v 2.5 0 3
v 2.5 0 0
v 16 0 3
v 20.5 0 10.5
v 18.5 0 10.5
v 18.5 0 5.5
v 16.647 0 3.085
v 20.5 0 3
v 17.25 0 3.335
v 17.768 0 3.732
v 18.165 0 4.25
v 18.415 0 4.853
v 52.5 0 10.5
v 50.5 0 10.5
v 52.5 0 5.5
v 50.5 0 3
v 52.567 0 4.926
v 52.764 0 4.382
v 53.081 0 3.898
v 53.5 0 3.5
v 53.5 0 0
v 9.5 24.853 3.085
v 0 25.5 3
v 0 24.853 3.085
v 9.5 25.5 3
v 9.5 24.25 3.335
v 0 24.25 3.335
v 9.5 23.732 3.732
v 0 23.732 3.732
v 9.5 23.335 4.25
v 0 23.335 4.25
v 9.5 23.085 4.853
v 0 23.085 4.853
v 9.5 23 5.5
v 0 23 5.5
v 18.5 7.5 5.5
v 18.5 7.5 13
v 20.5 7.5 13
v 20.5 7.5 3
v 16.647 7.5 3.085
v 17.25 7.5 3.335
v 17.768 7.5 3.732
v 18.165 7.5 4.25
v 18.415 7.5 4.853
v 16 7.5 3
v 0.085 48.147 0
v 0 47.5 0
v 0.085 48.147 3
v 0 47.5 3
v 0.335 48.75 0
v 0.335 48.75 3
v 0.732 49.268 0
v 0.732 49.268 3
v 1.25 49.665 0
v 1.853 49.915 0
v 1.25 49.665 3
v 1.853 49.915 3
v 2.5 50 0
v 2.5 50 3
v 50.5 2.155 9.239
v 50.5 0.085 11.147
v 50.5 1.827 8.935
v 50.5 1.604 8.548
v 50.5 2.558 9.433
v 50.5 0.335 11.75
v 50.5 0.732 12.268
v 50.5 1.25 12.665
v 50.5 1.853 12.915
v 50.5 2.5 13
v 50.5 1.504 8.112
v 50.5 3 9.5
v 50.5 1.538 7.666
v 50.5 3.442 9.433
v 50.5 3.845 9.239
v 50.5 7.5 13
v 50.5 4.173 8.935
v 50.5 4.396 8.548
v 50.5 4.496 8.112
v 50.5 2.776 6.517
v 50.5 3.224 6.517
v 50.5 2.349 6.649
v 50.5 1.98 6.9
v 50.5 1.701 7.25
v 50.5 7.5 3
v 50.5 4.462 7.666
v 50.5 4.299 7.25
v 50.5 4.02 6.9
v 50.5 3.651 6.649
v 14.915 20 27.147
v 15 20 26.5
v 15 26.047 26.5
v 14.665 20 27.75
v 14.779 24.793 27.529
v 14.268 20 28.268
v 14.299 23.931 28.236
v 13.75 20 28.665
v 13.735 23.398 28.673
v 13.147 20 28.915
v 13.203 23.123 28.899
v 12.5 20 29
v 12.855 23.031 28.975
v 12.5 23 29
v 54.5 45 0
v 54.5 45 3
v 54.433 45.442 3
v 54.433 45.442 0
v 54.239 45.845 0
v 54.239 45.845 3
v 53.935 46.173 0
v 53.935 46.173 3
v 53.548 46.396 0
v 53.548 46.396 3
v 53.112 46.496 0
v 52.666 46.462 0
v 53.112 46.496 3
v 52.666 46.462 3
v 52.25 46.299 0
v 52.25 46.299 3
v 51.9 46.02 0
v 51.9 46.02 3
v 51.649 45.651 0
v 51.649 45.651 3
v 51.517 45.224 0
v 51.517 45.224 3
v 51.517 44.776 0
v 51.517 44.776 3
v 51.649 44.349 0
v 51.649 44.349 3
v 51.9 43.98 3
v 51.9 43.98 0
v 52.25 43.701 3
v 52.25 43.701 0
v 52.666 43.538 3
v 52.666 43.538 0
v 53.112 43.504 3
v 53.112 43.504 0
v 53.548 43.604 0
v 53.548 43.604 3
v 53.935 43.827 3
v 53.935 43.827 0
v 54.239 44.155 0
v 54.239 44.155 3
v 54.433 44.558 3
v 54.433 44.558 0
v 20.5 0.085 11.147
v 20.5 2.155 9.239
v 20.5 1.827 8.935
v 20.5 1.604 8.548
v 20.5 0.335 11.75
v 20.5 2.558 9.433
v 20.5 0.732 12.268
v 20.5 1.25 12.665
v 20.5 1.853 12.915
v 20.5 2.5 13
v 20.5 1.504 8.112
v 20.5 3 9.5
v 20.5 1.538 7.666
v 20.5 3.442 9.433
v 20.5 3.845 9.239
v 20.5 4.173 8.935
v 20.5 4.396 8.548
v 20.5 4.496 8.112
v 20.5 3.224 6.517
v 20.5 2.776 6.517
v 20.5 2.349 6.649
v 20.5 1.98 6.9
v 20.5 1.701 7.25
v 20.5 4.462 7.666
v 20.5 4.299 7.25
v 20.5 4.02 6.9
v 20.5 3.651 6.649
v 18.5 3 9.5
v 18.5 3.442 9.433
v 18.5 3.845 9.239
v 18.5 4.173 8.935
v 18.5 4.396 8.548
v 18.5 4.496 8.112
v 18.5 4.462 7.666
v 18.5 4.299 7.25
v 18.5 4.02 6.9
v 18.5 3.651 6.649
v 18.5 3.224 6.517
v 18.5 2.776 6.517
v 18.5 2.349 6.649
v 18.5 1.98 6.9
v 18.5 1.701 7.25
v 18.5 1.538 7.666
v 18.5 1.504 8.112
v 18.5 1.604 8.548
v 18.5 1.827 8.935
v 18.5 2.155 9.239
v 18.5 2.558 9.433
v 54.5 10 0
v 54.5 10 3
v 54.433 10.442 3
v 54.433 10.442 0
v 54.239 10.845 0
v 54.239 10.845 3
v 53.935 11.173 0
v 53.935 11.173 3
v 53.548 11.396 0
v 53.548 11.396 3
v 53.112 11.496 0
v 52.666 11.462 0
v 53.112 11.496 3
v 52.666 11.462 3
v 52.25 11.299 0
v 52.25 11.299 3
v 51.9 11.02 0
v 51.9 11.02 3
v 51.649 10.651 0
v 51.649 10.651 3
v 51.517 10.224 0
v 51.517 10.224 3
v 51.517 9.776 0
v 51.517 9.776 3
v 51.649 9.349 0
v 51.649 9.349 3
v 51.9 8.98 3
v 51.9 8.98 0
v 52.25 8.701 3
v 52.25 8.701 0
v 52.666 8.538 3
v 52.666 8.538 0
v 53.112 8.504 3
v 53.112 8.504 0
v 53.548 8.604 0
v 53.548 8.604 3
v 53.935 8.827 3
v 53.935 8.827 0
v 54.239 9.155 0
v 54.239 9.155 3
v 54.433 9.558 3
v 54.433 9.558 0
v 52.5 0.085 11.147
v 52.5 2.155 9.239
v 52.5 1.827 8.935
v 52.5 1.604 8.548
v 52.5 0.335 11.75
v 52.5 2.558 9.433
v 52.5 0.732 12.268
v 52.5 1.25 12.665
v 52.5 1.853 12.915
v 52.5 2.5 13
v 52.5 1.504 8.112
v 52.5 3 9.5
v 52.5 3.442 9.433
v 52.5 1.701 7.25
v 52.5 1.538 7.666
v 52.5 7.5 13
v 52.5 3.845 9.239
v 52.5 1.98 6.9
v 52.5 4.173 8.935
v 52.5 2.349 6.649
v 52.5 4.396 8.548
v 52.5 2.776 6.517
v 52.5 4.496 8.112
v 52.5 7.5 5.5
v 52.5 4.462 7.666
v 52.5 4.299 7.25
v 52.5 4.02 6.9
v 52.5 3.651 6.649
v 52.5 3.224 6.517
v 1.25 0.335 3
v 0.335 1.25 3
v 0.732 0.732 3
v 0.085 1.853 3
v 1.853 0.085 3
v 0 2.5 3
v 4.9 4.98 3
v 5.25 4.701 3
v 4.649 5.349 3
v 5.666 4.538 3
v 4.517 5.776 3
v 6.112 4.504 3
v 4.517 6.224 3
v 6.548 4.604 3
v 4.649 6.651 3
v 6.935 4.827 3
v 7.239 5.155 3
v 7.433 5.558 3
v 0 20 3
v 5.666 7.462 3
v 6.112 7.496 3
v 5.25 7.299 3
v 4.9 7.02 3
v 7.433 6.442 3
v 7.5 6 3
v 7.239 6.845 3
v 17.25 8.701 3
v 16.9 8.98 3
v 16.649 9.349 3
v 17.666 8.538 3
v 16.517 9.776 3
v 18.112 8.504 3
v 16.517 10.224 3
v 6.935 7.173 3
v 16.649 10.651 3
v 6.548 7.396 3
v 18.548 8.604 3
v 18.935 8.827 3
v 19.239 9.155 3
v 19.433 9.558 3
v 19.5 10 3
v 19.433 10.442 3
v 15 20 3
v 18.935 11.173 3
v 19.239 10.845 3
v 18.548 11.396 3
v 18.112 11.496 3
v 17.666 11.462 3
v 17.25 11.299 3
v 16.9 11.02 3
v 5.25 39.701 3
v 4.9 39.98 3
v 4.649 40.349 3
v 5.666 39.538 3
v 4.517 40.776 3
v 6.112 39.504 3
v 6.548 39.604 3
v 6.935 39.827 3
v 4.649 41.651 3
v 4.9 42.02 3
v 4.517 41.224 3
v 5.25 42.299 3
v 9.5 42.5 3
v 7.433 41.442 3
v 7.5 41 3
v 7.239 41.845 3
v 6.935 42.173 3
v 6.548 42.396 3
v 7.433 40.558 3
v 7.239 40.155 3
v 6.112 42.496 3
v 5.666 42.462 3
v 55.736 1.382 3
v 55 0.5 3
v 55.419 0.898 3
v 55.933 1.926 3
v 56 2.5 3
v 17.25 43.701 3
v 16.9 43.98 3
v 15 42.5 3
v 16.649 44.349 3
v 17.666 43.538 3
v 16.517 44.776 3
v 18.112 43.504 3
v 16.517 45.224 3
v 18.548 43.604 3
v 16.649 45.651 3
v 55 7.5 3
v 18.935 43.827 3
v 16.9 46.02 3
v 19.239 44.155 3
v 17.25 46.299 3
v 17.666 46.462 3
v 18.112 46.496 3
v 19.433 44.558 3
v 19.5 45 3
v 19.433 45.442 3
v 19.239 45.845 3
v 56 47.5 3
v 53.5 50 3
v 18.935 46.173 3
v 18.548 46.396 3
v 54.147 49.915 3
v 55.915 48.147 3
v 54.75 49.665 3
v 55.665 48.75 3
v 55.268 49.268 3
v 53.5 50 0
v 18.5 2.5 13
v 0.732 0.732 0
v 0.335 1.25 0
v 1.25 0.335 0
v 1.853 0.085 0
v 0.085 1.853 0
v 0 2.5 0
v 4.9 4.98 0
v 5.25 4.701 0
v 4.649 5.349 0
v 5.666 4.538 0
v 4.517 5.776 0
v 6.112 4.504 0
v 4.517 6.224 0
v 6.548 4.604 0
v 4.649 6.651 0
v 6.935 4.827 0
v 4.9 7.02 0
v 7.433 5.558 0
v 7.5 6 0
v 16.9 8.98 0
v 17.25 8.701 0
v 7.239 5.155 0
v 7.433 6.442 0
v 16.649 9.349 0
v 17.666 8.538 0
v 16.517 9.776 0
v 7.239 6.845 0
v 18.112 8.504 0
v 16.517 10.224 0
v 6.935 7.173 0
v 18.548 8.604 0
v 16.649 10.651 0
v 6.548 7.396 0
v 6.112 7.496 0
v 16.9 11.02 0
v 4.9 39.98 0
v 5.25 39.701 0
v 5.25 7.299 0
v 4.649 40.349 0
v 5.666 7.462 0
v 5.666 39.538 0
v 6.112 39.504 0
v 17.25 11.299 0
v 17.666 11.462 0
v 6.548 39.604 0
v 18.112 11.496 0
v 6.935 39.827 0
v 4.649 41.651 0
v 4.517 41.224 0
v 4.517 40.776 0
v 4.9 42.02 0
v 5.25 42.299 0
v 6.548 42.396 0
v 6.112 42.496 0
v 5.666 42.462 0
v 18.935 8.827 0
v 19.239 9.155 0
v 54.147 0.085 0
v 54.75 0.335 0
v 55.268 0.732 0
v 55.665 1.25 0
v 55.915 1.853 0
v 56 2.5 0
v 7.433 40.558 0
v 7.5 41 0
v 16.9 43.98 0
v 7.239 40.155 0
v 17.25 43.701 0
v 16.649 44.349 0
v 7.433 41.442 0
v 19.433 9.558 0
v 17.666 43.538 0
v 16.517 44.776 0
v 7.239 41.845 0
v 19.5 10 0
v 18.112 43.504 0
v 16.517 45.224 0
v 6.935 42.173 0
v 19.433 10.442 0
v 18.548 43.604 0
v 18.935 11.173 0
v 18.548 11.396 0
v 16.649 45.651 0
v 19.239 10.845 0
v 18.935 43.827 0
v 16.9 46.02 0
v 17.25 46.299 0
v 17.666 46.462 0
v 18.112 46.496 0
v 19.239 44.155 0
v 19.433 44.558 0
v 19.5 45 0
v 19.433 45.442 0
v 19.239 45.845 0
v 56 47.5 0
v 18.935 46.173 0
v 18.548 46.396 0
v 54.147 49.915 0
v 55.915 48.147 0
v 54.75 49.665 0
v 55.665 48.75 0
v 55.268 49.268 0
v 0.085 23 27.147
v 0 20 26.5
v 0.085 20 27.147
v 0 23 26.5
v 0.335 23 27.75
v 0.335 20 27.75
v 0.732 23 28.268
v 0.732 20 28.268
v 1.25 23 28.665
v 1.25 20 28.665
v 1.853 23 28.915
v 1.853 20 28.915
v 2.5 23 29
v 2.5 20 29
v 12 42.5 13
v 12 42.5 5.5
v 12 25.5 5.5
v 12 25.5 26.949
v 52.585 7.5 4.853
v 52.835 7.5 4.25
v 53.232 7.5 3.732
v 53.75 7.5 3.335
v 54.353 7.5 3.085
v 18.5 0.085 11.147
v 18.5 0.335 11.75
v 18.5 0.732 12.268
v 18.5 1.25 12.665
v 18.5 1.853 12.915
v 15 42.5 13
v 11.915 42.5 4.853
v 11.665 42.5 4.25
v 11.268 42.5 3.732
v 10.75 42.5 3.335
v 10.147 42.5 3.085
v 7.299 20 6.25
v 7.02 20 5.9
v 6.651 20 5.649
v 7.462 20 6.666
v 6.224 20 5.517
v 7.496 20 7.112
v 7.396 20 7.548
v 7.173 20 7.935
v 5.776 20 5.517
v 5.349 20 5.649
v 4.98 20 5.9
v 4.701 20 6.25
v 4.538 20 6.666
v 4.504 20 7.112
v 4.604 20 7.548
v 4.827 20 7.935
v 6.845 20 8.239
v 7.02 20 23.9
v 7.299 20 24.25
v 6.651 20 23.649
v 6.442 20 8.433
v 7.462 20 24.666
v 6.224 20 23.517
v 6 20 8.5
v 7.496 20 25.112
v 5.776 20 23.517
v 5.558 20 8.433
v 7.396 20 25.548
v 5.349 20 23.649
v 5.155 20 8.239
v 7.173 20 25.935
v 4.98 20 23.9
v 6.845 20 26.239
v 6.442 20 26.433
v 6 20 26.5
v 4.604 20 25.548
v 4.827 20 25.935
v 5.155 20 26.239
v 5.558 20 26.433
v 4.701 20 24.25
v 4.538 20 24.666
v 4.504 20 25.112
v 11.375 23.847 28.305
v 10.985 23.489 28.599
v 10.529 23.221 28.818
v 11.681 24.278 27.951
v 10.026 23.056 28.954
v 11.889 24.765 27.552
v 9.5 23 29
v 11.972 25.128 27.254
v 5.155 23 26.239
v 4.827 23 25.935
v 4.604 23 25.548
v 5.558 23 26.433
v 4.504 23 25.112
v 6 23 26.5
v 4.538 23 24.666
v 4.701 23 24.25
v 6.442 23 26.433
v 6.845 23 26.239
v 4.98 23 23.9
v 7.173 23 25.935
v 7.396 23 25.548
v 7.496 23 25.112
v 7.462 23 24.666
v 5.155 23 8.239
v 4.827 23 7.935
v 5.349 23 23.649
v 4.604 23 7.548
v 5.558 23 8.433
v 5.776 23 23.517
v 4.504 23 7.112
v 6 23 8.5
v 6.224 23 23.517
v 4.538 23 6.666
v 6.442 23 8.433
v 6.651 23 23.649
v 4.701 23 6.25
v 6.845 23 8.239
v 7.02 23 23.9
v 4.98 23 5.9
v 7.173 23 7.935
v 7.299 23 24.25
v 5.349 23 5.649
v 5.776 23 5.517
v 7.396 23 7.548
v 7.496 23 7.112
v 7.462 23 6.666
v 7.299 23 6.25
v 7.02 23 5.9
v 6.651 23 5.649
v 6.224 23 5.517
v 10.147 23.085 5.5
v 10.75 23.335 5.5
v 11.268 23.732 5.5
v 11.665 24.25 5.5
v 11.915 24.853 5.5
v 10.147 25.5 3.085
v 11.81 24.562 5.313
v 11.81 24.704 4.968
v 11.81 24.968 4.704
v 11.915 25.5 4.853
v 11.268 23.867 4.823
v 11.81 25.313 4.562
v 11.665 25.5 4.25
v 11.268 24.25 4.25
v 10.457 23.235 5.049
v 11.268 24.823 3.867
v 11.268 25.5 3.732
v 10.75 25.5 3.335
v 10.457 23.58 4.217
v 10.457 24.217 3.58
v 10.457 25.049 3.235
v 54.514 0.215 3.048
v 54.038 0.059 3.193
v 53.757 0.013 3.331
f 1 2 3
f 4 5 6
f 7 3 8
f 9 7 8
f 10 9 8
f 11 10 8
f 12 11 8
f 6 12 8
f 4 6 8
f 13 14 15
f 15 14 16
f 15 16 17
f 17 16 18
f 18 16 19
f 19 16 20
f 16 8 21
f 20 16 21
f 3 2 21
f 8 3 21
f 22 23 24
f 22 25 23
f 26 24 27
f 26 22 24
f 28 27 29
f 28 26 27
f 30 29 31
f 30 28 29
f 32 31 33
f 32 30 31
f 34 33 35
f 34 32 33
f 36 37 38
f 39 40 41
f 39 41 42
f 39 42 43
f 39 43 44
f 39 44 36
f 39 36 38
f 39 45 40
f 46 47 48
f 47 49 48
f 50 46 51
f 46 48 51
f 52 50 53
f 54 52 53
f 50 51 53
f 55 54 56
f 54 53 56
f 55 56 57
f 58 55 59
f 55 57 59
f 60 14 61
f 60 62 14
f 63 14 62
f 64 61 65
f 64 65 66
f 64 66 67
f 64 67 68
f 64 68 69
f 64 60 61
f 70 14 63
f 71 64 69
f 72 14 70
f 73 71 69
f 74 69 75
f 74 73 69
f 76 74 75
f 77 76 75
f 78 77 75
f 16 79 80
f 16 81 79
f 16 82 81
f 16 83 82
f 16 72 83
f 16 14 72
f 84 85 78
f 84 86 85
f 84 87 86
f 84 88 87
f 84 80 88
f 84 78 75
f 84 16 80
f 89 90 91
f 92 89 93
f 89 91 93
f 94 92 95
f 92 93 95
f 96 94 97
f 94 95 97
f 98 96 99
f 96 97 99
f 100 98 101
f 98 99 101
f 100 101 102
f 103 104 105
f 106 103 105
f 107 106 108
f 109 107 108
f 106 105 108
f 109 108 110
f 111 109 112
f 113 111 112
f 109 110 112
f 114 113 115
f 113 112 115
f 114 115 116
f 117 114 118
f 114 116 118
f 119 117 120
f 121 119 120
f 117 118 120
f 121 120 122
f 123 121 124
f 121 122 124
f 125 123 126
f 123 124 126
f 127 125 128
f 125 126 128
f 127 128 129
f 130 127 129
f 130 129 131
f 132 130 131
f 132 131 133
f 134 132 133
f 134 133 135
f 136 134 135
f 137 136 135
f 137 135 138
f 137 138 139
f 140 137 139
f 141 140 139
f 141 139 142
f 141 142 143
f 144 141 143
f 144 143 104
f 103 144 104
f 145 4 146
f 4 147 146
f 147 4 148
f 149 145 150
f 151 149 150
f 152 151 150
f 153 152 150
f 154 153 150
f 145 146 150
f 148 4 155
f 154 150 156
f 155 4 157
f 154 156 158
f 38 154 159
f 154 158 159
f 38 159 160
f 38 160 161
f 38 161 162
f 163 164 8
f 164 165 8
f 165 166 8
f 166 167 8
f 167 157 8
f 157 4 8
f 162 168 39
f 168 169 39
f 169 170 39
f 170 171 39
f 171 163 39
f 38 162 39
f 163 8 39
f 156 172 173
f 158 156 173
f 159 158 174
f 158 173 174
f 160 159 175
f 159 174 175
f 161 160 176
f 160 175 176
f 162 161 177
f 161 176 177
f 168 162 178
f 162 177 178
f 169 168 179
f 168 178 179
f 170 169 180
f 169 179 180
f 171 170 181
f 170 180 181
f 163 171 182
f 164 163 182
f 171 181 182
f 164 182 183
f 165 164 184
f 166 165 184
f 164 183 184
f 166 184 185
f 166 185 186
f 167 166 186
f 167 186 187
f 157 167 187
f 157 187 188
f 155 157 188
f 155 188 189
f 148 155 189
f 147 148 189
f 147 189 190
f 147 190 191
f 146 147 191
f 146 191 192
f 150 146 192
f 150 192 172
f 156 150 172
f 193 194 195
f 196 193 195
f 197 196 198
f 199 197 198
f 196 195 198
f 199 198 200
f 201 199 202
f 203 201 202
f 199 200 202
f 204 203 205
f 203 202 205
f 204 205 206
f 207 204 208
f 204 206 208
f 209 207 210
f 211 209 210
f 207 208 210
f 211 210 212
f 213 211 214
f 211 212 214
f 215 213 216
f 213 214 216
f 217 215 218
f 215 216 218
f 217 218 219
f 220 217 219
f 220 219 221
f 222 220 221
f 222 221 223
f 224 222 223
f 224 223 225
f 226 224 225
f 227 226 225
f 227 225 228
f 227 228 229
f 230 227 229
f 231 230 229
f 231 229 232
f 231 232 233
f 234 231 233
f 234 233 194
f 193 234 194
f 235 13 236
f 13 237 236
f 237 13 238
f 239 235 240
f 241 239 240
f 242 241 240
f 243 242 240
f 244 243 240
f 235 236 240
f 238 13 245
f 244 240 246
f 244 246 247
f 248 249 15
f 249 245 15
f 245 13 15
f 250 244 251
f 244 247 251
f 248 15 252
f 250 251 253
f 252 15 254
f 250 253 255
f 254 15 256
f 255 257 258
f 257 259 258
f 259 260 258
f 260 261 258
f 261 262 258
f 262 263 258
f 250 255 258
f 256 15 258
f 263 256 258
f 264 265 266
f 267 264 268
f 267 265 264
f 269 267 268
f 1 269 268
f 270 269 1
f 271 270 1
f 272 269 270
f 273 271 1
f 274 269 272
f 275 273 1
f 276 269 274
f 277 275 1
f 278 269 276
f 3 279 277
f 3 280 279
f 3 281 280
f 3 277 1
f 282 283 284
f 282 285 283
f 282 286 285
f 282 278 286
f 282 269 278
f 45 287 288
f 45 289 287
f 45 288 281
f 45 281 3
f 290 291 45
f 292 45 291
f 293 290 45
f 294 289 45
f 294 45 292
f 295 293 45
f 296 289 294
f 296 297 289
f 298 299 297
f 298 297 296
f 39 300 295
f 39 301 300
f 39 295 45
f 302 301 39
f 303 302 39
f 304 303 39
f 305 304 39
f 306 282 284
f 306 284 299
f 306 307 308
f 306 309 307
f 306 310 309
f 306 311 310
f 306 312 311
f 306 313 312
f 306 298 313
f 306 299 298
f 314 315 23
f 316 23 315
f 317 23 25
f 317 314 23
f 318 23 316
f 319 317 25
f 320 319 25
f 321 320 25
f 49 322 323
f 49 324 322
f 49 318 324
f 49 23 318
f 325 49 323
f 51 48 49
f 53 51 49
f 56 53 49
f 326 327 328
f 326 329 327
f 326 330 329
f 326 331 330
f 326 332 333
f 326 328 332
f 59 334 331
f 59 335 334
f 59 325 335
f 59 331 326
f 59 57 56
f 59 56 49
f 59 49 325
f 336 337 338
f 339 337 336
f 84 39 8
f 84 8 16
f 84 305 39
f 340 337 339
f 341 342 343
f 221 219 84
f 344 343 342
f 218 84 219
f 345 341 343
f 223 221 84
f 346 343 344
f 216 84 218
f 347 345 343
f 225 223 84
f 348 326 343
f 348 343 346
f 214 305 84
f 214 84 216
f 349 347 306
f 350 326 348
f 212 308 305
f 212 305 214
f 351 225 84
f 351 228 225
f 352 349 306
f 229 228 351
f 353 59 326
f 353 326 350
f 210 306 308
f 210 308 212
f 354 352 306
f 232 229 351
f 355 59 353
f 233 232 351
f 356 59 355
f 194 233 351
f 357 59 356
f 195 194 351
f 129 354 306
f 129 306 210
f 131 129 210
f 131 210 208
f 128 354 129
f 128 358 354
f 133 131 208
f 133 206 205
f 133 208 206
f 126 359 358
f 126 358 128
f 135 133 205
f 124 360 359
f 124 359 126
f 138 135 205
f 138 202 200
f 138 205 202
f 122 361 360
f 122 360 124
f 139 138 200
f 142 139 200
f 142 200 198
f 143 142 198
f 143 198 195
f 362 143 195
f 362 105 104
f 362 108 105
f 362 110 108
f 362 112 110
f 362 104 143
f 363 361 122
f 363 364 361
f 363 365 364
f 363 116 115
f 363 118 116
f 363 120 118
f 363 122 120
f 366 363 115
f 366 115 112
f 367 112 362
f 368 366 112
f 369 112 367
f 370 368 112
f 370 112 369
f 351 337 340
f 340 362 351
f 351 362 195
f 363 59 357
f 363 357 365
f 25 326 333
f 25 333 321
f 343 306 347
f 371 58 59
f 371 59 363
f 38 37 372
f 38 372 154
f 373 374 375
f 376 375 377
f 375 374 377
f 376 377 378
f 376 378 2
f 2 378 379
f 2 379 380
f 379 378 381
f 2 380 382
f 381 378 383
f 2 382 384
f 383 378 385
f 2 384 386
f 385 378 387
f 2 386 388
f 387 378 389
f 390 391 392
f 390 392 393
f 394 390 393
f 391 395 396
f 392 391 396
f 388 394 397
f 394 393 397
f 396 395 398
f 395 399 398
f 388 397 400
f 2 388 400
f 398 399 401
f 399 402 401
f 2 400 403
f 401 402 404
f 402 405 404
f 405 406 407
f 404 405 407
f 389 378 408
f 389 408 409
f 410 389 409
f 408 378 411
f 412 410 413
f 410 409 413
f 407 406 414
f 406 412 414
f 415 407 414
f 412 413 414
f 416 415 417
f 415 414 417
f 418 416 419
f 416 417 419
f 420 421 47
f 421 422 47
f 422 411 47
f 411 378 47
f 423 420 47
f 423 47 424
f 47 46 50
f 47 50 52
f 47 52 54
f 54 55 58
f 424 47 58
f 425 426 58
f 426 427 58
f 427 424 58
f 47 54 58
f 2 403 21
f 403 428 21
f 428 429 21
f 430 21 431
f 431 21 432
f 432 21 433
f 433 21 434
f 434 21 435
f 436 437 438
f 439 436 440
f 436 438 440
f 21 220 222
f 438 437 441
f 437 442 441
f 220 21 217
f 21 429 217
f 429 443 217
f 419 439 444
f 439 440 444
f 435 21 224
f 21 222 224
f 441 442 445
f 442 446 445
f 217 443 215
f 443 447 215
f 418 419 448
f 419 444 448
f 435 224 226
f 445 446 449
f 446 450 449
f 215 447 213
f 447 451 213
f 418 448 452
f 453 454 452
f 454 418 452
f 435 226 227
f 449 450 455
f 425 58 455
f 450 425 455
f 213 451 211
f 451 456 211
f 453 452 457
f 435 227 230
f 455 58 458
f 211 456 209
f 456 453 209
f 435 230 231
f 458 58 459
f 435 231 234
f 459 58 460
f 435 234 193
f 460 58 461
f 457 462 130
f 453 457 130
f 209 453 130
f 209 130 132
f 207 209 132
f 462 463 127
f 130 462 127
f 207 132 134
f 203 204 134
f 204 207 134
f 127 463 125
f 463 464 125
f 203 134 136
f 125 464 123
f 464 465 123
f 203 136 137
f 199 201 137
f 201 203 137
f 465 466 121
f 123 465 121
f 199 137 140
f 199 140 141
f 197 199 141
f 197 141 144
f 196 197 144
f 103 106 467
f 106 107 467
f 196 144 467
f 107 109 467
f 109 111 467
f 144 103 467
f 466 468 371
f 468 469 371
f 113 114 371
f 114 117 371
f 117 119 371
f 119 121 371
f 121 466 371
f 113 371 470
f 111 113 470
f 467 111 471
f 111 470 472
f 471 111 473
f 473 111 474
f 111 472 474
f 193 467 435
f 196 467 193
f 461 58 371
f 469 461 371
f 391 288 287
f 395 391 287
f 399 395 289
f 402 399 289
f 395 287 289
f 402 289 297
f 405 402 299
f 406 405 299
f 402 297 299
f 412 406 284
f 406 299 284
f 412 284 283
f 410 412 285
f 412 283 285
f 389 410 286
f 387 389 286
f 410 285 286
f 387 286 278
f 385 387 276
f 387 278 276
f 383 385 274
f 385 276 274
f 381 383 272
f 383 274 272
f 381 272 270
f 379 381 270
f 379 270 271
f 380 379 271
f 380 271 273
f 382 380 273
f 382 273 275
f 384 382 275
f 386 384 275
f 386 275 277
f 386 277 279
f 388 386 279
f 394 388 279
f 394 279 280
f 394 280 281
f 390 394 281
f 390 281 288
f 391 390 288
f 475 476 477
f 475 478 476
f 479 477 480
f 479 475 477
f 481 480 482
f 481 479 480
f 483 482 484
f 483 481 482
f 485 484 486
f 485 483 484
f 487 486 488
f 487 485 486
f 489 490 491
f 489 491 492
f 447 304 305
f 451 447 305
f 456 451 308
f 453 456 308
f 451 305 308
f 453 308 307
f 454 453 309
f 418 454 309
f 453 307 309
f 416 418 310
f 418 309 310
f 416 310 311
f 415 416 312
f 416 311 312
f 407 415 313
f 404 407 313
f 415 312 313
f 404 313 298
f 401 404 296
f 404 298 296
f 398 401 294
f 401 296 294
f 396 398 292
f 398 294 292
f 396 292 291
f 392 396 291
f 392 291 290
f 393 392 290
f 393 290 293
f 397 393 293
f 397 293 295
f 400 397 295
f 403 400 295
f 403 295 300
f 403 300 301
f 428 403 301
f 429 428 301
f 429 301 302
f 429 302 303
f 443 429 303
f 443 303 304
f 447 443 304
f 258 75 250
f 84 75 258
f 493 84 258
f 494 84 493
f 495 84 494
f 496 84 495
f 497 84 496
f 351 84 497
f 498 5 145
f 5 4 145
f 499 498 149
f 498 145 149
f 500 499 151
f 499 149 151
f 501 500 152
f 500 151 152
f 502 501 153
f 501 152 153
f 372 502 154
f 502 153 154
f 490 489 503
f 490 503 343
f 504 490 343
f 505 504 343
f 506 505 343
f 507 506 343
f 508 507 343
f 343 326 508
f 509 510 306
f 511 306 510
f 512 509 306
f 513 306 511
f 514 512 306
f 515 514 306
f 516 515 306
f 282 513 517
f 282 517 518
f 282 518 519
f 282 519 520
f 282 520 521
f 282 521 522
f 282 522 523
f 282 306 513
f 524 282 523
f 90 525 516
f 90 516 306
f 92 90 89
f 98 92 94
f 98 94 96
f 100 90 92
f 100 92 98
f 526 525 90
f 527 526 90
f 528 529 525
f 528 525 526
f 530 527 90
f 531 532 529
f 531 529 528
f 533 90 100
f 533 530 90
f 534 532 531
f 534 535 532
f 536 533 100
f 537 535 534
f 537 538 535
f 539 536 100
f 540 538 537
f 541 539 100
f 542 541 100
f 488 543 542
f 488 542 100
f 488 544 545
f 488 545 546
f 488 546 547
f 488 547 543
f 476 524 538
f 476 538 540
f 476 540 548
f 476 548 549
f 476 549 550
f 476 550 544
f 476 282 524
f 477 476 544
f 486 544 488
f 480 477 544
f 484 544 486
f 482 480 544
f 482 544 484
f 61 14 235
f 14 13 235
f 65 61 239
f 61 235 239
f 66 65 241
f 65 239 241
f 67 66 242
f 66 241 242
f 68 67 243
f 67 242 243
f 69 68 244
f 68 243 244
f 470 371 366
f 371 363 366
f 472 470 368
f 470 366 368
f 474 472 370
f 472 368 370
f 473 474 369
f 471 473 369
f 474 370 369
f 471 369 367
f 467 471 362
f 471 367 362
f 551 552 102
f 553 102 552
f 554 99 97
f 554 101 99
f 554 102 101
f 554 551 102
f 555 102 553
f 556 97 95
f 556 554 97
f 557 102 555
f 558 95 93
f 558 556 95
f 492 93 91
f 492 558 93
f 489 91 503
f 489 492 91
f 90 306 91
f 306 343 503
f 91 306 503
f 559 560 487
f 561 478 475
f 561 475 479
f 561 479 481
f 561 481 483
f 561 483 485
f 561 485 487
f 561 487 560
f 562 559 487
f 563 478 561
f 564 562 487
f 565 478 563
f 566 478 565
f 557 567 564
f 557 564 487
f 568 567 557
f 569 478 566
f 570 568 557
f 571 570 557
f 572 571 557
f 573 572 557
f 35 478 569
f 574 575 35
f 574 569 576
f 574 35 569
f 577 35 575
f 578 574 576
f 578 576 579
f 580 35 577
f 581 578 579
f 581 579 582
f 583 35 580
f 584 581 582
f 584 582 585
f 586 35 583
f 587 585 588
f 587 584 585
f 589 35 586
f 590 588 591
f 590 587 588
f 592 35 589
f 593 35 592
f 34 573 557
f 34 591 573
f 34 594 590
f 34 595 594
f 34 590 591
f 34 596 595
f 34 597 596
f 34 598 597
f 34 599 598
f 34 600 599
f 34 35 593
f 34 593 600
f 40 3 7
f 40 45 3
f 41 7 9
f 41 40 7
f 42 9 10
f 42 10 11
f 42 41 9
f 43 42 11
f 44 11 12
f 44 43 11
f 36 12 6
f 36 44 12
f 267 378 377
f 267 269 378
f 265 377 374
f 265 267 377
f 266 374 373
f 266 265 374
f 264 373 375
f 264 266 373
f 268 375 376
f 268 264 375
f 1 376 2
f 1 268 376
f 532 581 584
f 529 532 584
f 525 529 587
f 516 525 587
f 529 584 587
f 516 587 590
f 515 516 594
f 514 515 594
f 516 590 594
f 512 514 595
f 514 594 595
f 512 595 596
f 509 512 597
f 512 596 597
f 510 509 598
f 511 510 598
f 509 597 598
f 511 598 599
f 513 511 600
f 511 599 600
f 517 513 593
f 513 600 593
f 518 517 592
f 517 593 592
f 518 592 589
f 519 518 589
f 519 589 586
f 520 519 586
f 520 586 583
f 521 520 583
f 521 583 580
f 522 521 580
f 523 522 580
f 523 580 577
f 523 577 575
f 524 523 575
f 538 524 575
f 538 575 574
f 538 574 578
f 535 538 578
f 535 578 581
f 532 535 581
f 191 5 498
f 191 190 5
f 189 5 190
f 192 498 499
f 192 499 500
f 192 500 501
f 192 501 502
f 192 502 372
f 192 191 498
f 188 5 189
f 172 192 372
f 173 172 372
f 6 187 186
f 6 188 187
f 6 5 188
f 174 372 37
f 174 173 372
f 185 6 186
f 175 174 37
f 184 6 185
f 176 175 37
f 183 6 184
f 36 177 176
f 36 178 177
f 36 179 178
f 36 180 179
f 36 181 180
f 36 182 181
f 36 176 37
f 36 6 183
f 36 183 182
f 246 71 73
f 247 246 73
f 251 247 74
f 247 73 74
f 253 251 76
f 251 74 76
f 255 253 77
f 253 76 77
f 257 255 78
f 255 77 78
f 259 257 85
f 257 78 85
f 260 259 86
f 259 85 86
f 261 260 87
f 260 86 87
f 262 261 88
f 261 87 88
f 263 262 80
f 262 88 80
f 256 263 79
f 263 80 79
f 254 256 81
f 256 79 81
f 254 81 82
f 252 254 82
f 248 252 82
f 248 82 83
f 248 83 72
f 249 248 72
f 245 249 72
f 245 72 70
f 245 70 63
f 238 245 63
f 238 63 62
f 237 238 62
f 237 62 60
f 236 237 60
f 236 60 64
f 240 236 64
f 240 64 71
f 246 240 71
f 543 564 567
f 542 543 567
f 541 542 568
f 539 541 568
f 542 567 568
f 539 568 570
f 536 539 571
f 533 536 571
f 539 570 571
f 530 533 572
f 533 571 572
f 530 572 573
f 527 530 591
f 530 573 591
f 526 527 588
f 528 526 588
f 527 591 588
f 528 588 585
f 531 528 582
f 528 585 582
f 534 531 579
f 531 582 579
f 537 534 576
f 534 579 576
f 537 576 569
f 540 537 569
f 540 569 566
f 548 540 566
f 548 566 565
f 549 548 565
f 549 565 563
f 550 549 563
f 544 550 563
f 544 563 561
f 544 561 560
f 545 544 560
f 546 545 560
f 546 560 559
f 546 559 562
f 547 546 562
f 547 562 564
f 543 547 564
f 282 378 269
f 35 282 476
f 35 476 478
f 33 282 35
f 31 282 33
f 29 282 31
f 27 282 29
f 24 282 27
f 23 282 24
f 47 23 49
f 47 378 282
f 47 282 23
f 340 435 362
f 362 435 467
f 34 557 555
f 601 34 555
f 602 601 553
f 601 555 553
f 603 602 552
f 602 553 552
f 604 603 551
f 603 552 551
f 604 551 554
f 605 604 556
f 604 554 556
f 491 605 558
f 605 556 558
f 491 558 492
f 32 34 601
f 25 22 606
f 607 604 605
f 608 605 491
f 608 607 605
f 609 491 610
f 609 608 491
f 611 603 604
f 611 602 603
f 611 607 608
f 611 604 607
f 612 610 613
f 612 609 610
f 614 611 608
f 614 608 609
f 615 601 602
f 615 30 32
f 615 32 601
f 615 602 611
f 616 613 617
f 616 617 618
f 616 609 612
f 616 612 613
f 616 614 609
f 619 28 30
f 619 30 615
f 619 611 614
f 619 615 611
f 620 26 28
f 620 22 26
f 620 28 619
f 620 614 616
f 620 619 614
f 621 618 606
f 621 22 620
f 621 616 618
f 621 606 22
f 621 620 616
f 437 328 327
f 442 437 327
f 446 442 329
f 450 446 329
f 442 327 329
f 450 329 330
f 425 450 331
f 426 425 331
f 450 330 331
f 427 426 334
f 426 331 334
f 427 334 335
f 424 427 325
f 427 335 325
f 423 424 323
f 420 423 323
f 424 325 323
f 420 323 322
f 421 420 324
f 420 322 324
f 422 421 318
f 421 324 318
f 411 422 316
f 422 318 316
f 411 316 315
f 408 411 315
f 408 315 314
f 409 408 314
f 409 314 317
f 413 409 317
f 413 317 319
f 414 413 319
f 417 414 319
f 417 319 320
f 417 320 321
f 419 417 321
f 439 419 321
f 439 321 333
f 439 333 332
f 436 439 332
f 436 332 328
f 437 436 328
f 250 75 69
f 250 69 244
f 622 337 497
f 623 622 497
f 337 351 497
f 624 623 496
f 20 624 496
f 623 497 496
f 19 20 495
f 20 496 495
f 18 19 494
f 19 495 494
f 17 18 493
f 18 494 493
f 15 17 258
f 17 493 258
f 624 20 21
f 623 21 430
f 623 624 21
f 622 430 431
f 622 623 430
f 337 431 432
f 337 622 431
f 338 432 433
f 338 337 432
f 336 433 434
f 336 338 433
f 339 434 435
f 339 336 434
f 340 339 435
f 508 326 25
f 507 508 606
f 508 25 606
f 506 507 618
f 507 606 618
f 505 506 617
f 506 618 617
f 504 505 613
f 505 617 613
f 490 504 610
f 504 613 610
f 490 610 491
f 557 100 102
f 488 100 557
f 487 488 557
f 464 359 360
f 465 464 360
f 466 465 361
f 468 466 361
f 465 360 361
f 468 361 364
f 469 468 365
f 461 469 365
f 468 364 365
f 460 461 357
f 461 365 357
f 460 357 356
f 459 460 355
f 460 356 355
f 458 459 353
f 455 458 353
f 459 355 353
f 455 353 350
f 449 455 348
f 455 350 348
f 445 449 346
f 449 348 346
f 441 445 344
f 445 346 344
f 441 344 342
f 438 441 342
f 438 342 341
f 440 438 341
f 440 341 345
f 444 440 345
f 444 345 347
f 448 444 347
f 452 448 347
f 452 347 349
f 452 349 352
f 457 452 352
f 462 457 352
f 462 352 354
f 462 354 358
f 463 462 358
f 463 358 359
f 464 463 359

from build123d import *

# Parameters (mm, degrees)
SKETCH1_W           = 56
SKETCH1_H           = 50
BOSS_EXTRUDE1_DEPTH = 3
SKETCH2_R           = 1.5
CUT_EXTRUDE1_DEPTH  = 76.133215025
SKETCH3_W           = 12
SKETCH3_H           = 3
BOSS_EXTRUDE2_DEPTH = 26
SKETCH5_R           = 1.5
CUT_EXTRUDE2_DEPTH  = 10
BOSS_EXTRUDE3_DEPTH = 3
SKETCH7_W           = 2
SKETCH7_H           = 7.5
BOSS_EXTRUDE4_DEPTH = 10
SKETCH8_R           = 1.5
CUT_EXTRUDE3_DEPTH  = 69.900290275
FILLET1_R           = 2.5
FILLET2_R           = 2.5
FILLET3_R           = 2.5
FILLET4_R           = 2.5


with BuildPart() as part:
    # Sketch1 → Boss-Extrude1 (new body)
    with BuildSketch(Plane.XY):
        with Locations((28, 25)):
            Rectangle(SKETCH1_W, SKETCH1_H)
    extrude(amount=BOSS_EXTRUDE1_DEPTH)

    # Sketch2 → Cut-Extrude1 (cut, through all)
    with BuildSketch(Plane.XY.offset(3)):
        with Locations((18, 10)):
            Circle(SKETCH2_R)
        with Locations((18, 45)):
            Circle(SKETCH2_R)
        with Locations((53, 45)):
            Circle(SKETCH2_R)
        with Locations((53, 10)):
            Circle(SKETCH2_R)
        with Locations((6, 6)):
            Circle(SKETCH2_R)
        with Locations((6, 41)):
            Circle(SKETCH2_R)
    extrude(amount=-CUT_EXTRUDE1_DEPTH, mode=Mode.SUBTRACT)

    # Sketch3 → Boss-Extrude2 (add)
    with BuildSketch(Plane.XY.offset(3)):
        with Locations((6, 21.5)):
            Rectangle(SKETCH3_W, SKETCH3_H)
    extrude(amount=BOSS_EXTRUDE2_DEPTH)

    # Sketch5 → Cut-Extrude2 (cut)
    with BuildSketch(Plane(origin=(0, 23, 0), x_dir=(1, 0, 0), z_dir=(0, 1, 0))):
        with Locations(Location((6, -7, 0), (0, 0, 270))):
            Circle(SKETCH5_R)
        with Locations(Location((6, -25, 0), (0, 0, 270))):
            Circle(SKETCH5_R)
    extrude(amount=-CUT_EXTRUDE2_DEPTH, mode=Mode.SUBTRACT)

    # Sketch6 → Boss-Extrude3 (add)
    with BuildSketch(Plane(origin=(12, 0, 0), x_dir=(0, 0, -1), z_dir=(1, 0, 0))):
        Polygon((-3, 20), (-29, 20), (-29, 23), (-13, 42.5), (-3, 42.5), align=None)
    extrude(amount=BOSS_EXTRUDE3_DEPTH)

    # Sketch7 → Boss-Extrude4 (add)
    with BuildSketch(Plane.XY.offset(3)):
        with Locations((19.5, 3.75)):
            Rectangle(SKETCH7_W, SKETCH7_H)
        with Locations((51.5, 3.75)):
            Rectangle(SKETCH7_W, SKETCH7_H)
    extrude(amount=BOSS_EXTRUDE4_DEPTH)

    # Sketch8 → Cut-Extrude3 (cut, through all)
    with BuildSketch(Plane.ZY.offset(-18.5)):
        with Locations((8, 3)):
            Circle(SKETCH8_R)
    extrude(amount=-CUT_EXTRUDE3_DEPTH, mode=Mode.SUBTRACT)

    # Fillet1
    fillet1_edges = [part.edges().sort_by_distance(p)[0] for p in [
        (0, 50, 1.5),
        (56, 50, 1.5),
        (56, 0, 1.5),
        (0, 0, 1.5),
    ]]
    fillet(fillet1_edges, radius=FILLET1_R)

    # Fillet2
    fillet2_edges = [part.edges().sort_by_distance(p)[0] for p in [
        (6, 23, 3),
        (12, 23, 16),
        (12, 32.75, 3),
        (18.5, 3.75, 3),
        (52.5, 3.75, 3),
    ]]
    fillet(fillet2_edges, radius=FILLET2_R - 0.0001)  # a hair under: the kernel refuses the full size

    # Fillet3
    fillet3_edges = [part.edges().sort_by_distance(p)[0] for p in [
        (0, 21.5, 29),
        (15, 21.5, 29),
    ]]
    fillet(fillet3_edges, radius=FILLET3_R)

    # Fillet4
    fillet4_edges = [part.edges().sort_by_distance(p)[0] for p in [
        (19.5, 0, 13),
        (51.5, 0, 13),
    ]]
    fillet(fillet4_edges, radius=FILLET4_R)


solid = part.part
